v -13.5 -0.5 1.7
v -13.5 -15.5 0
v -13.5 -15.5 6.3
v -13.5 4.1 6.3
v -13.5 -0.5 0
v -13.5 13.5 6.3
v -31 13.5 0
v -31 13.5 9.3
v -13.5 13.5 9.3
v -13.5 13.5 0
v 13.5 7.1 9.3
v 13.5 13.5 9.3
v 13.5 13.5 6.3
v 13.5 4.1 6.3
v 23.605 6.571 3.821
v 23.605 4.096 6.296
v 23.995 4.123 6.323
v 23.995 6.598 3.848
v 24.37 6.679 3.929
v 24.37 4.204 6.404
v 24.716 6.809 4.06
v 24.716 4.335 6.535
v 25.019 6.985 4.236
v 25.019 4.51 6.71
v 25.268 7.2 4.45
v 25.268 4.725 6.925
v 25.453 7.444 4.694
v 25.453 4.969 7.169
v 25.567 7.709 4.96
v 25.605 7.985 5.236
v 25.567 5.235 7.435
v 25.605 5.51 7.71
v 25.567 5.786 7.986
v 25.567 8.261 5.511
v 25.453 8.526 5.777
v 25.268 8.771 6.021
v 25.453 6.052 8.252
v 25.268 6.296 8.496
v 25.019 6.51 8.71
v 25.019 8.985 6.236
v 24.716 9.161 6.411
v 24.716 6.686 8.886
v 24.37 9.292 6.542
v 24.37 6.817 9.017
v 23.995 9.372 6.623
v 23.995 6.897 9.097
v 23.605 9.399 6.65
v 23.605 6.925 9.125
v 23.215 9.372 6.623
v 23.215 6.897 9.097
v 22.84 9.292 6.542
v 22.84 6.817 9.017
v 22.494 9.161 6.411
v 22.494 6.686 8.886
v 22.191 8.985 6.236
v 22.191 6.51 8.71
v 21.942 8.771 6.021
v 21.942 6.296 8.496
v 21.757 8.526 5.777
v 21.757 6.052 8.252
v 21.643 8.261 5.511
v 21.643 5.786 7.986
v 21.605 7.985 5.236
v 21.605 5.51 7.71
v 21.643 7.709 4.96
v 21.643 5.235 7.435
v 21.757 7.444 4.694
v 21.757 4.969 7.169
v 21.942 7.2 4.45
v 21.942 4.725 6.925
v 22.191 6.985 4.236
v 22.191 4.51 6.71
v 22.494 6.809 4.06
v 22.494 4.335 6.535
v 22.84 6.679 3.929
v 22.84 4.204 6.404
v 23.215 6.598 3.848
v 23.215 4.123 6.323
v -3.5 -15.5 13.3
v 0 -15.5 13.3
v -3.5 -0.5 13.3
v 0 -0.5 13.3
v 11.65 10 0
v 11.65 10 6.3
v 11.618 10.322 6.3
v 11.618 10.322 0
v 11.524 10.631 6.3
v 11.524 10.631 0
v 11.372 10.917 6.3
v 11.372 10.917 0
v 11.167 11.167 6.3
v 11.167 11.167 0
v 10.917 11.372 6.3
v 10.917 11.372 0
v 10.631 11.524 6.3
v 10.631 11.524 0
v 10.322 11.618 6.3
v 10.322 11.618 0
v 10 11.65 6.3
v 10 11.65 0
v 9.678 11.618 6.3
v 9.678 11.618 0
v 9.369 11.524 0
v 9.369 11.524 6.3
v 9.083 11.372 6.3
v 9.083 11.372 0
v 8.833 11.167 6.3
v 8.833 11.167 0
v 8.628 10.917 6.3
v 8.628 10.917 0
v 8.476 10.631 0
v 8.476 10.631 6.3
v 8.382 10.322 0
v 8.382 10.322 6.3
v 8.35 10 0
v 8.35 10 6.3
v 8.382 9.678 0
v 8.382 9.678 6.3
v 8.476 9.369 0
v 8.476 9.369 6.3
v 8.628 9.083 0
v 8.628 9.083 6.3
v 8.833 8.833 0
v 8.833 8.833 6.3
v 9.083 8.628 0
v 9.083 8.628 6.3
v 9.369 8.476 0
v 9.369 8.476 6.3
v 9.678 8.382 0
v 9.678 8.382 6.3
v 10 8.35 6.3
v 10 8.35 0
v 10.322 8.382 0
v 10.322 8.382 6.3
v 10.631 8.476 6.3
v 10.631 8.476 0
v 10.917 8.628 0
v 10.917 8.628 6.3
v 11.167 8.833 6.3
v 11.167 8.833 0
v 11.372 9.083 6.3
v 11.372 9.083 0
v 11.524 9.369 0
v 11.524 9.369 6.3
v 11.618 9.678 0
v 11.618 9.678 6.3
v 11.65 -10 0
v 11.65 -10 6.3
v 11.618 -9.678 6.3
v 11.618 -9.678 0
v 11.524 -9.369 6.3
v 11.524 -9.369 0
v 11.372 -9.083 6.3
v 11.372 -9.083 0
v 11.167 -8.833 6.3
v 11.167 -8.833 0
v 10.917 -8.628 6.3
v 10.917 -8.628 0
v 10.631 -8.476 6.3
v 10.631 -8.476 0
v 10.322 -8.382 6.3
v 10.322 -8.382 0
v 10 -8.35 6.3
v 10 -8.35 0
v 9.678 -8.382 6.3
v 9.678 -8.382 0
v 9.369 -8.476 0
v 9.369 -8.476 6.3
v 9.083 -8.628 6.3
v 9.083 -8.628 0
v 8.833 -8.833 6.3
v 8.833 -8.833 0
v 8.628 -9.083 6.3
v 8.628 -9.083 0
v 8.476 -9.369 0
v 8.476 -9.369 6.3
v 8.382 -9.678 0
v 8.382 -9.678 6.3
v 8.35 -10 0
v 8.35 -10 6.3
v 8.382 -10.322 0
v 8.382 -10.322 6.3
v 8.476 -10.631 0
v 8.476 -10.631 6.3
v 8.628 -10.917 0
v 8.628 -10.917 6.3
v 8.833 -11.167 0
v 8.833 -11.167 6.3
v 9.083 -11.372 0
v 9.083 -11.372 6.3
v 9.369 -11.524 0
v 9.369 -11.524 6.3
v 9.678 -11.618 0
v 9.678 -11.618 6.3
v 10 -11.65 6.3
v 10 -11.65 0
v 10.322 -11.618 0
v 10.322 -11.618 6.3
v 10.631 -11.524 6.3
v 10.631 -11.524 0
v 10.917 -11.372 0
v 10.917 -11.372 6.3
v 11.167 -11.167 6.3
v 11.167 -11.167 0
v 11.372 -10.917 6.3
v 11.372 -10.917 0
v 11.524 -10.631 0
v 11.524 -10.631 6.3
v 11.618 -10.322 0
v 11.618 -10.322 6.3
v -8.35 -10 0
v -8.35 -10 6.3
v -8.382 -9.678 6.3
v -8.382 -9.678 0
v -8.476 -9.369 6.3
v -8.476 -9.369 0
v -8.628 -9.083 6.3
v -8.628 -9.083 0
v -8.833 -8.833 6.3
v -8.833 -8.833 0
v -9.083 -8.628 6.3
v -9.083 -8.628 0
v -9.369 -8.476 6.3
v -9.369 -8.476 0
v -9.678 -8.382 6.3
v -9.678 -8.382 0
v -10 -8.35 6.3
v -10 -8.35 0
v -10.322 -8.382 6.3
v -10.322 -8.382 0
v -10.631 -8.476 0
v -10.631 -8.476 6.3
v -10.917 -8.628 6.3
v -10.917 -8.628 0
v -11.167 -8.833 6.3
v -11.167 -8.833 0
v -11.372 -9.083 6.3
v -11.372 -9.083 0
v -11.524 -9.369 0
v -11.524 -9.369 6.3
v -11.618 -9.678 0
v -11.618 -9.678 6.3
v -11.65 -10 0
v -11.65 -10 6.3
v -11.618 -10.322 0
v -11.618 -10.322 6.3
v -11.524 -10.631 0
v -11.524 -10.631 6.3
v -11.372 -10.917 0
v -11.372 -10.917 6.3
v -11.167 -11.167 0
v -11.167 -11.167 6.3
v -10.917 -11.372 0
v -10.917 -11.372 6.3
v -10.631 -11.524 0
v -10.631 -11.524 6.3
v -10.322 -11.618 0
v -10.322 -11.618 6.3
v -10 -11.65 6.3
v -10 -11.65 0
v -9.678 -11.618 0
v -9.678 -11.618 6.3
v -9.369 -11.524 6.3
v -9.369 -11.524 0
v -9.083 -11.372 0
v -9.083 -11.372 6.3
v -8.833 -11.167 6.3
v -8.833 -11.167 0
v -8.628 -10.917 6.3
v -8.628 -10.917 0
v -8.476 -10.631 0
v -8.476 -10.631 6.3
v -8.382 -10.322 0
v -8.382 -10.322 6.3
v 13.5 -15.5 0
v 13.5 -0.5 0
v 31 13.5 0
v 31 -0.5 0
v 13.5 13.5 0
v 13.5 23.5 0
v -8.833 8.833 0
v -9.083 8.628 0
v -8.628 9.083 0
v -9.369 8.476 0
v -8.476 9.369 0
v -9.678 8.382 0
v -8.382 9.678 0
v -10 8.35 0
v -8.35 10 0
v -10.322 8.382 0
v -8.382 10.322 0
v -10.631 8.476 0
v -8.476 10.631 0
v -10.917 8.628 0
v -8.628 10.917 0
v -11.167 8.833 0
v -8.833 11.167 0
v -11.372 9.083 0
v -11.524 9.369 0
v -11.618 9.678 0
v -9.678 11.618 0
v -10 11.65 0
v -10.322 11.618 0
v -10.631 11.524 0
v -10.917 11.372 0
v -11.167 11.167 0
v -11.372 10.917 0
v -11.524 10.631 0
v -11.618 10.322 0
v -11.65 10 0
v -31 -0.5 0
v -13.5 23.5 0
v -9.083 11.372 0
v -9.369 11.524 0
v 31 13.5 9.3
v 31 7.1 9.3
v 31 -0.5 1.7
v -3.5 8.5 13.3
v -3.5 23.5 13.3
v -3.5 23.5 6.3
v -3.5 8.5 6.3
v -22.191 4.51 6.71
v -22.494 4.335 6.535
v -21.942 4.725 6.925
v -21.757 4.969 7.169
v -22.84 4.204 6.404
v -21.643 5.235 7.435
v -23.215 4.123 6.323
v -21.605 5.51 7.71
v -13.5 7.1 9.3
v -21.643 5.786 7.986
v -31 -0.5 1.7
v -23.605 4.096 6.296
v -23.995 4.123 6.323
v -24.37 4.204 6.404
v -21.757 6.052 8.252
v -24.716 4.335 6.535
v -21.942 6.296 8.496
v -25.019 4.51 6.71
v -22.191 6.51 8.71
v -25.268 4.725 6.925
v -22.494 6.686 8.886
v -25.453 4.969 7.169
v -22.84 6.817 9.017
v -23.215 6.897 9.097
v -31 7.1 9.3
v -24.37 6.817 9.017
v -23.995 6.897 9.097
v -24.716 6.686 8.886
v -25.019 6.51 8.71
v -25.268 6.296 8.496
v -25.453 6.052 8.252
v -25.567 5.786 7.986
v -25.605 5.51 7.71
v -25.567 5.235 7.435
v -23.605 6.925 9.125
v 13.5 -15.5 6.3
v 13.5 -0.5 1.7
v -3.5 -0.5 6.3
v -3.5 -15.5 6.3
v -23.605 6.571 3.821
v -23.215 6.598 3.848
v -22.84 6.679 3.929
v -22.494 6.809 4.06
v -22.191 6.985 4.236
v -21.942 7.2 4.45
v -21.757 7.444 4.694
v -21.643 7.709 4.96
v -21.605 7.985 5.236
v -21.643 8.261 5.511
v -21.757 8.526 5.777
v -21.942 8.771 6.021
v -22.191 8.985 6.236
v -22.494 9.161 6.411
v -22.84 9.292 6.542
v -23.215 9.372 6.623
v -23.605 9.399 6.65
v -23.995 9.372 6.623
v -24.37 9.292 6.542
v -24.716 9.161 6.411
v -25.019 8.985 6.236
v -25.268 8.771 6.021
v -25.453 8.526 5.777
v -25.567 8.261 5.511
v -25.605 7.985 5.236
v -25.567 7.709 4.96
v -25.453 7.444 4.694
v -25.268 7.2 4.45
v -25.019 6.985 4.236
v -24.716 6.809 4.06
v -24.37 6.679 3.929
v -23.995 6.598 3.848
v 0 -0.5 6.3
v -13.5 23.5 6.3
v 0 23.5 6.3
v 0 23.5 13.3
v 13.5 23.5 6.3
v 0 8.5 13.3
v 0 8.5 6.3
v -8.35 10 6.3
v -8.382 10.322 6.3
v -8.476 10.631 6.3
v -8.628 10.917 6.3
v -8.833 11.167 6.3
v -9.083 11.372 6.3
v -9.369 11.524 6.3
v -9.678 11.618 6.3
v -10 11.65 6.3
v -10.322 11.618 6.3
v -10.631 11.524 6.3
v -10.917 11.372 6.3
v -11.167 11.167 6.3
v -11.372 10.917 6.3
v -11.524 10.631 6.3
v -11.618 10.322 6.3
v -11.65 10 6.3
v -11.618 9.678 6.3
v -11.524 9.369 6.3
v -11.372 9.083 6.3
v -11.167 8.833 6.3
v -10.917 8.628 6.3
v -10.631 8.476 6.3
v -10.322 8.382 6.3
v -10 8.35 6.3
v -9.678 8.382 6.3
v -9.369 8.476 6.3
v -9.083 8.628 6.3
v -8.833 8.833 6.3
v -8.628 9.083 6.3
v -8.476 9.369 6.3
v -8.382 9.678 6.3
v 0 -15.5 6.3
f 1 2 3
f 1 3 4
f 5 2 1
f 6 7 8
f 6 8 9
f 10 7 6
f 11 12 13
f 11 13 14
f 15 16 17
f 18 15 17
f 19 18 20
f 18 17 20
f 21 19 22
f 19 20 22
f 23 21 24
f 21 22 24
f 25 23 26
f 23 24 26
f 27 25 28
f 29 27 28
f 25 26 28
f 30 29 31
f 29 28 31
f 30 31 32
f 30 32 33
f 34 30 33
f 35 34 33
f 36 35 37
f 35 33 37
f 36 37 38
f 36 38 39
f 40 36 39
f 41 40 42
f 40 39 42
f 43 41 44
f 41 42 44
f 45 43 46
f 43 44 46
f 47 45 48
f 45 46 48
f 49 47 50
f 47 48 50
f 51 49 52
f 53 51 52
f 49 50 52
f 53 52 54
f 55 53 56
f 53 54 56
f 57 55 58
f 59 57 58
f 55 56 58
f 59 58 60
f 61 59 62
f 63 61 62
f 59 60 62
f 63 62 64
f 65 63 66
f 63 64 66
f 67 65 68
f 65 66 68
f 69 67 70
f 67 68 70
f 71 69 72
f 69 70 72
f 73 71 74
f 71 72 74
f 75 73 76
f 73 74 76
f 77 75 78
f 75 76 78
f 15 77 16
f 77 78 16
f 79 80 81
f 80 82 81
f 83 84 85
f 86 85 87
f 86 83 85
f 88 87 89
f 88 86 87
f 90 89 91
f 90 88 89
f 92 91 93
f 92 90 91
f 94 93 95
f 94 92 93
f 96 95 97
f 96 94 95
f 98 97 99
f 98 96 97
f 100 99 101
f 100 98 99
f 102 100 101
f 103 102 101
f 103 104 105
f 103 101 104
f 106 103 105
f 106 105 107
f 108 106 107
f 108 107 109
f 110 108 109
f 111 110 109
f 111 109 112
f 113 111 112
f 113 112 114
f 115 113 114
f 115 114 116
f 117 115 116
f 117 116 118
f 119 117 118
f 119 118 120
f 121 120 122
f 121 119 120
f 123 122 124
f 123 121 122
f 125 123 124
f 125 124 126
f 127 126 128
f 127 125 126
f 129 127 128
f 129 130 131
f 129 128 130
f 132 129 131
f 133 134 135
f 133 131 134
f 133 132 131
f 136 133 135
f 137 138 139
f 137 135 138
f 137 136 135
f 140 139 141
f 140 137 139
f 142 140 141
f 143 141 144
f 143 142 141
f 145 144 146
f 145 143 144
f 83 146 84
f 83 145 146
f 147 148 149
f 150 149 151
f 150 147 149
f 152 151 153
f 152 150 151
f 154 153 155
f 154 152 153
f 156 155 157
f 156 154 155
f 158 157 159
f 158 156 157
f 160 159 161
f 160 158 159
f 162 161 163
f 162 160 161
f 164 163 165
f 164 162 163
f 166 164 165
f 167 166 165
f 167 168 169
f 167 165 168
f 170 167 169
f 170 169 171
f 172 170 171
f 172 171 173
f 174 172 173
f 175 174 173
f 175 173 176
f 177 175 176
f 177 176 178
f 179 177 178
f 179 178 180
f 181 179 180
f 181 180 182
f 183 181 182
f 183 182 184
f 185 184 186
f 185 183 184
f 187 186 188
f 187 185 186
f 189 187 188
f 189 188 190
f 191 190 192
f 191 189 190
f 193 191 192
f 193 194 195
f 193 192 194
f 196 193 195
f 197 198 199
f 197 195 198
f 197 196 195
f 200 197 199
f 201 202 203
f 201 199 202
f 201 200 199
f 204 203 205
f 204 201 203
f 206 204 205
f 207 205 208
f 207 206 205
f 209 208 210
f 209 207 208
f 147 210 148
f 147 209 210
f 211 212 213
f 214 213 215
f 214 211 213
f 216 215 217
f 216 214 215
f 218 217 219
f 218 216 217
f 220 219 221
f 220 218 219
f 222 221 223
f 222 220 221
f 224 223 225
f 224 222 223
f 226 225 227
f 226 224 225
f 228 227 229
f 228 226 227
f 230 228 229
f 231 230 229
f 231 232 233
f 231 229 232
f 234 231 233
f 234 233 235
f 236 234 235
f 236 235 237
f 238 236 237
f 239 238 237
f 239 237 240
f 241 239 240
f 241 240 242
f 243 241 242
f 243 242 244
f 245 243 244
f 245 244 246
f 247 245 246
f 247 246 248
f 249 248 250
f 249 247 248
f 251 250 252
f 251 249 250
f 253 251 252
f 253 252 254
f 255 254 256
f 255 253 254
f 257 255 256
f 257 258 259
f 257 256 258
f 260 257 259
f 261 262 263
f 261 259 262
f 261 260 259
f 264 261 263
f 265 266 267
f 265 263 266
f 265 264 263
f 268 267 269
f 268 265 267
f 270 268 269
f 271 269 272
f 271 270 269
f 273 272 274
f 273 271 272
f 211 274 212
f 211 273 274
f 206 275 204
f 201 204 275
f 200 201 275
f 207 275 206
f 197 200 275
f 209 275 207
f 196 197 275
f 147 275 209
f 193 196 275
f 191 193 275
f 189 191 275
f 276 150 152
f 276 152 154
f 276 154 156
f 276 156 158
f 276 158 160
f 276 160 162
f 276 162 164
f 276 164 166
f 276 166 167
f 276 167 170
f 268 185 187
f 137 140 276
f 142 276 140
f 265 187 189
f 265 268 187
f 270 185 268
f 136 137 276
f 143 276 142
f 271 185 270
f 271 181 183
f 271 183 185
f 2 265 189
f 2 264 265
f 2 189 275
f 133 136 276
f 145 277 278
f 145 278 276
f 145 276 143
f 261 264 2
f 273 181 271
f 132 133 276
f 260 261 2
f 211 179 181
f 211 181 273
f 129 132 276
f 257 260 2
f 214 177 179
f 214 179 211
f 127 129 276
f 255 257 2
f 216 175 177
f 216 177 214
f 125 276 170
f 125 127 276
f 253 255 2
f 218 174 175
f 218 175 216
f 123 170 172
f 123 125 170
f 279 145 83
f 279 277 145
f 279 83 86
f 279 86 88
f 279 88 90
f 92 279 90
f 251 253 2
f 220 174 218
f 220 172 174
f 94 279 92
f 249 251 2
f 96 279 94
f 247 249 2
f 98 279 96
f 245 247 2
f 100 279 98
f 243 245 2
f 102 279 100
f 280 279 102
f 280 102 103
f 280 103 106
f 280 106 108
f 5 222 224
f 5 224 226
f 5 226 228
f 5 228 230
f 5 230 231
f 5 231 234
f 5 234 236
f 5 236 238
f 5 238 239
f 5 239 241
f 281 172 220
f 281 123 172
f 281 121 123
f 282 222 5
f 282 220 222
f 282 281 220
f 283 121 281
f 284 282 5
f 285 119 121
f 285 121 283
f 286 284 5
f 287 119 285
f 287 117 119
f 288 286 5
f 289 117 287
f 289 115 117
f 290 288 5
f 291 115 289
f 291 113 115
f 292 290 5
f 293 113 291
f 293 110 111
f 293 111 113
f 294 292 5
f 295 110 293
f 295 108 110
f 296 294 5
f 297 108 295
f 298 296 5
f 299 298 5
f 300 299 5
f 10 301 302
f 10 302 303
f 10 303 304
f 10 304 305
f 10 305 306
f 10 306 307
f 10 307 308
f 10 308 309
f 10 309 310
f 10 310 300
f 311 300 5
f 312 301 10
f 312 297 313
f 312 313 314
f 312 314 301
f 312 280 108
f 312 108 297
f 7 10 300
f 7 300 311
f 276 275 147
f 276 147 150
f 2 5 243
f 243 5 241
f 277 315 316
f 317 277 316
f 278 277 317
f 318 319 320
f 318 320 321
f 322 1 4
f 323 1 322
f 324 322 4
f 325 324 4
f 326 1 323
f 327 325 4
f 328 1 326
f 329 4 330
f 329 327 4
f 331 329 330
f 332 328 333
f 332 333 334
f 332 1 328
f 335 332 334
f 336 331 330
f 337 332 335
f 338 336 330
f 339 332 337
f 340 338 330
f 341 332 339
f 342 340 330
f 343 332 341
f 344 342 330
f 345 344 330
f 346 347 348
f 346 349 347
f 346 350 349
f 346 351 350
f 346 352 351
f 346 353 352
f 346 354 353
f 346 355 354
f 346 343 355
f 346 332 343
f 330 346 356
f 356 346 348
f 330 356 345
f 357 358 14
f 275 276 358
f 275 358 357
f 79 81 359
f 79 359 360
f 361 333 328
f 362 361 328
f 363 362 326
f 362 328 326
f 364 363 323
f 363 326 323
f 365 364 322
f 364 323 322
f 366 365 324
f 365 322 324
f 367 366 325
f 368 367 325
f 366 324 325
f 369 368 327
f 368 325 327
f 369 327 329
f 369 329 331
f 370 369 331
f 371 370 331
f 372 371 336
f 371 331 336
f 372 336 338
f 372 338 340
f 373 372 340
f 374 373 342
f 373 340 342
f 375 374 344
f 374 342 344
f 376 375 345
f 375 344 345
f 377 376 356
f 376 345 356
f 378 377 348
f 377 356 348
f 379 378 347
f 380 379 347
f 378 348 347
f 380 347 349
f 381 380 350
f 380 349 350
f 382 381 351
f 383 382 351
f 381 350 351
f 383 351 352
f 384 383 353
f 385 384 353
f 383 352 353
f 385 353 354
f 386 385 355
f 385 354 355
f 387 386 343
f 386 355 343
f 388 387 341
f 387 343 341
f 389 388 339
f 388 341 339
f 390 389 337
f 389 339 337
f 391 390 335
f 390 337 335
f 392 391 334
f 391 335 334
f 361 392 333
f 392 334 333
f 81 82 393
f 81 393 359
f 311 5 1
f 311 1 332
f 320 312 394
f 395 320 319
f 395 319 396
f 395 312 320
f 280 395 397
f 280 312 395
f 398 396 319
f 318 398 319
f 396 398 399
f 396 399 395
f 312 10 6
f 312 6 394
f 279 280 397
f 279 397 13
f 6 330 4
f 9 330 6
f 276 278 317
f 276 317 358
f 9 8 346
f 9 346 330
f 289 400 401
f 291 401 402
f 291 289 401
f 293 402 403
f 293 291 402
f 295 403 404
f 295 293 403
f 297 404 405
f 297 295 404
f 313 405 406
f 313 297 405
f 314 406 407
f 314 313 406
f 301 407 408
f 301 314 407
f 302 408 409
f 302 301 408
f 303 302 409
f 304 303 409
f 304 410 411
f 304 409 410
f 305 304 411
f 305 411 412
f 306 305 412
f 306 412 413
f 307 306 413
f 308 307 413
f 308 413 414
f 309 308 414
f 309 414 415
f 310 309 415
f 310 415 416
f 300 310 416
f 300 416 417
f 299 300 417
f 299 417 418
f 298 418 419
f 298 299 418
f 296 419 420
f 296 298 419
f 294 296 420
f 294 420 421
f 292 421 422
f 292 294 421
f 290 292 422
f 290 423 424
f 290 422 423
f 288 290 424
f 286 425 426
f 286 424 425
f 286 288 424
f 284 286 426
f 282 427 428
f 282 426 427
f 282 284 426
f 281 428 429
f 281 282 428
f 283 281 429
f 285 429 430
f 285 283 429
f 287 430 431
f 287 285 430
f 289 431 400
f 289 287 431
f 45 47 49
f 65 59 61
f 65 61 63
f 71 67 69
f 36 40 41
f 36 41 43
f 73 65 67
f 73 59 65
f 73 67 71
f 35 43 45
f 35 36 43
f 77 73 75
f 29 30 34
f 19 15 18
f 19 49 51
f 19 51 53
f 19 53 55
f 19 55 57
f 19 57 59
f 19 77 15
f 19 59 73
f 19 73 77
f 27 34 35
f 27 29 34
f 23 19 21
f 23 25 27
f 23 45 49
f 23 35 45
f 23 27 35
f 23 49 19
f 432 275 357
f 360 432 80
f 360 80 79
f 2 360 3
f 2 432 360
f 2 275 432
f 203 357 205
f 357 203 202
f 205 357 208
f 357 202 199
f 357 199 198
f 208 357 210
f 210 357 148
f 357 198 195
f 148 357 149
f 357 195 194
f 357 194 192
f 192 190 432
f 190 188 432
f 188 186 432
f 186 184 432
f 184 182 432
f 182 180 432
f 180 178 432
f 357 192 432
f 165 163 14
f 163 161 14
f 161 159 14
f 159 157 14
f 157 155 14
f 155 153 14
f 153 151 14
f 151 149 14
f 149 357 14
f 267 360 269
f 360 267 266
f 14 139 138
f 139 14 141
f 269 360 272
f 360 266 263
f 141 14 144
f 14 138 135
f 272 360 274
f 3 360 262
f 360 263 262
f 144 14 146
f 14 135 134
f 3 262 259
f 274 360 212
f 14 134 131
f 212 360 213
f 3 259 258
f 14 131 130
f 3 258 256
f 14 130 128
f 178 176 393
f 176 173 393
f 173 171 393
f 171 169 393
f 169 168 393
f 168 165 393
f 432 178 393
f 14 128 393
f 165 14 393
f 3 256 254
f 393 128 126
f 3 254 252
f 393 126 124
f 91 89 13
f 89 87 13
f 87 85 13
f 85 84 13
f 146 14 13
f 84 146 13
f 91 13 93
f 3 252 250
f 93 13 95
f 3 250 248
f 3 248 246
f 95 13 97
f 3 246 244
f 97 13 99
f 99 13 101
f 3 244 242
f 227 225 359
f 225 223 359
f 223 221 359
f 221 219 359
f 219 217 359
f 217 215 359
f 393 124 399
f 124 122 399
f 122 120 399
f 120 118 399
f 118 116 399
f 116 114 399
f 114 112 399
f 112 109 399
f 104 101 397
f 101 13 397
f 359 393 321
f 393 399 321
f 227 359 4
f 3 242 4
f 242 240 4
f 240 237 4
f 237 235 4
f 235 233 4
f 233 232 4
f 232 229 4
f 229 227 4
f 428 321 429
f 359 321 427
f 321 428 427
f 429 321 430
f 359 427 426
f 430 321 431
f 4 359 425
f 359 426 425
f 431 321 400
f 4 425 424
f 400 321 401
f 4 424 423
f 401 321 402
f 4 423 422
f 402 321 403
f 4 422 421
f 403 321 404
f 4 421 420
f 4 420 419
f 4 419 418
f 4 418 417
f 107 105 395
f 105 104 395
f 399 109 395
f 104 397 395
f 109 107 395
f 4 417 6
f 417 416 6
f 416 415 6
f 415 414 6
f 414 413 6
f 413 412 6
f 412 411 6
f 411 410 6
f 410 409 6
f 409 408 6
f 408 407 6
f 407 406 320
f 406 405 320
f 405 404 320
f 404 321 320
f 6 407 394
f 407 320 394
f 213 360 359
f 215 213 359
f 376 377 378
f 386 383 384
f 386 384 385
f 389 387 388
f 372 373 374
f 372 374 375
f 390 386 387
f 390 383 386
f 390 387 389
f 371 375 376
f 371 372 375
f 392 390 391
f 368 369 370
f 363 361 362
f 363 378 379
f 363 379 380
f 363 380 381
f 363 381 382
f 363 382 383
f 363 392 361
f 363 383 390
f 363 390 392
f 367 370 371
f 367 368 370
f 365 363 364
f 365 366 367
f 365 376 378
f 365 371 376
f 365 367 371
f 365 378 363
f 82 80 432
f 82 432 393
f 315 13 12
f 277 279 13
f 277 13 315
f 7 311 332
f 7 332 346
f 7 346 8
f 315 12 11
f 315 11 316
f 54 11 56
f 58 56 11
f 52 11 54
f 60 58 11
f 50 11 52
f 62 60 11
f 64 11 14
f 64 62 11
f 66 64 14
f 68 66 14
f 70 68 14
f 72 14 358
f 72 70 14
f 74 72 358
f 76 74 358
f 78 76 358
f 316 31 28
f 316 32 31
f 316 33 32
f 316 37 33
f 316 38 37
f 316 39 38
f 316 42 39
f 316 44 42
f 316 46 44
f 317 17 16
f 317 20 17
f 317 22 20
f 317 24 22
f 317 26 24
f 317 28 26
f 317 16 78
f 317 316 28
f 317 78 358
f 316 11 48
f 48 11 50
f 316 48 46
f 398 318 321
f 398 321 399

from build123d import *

# Parameters (mm, degrees)
SKETCH_1_R             = 1.65
EXTRUDE_512_DEPTH      = 13.3
CUT_EXTRUDE_925_DEPTH  = 7
SKETCH_3_W             = 17.5
SKETCH_3_H             = 14
CUT_EXTRUDE_1164_DEPTH = 4
CUT_EXTRUDE_R_DEPTH    = 17.5
CUT_EXTRUDE_L_DEPTH    = 17.5
SKETCH_6_R             = 2
CUT_EXTRUDE_5_DEPTH    = 3.5


with BuildPart() as part:
    # Эскиз1 → Extrude 512 (new body)
    with BuildSketch(Plane.XY):
        Polygon((-13.5, 23.5), (13.5, 23.5), (13.5, 13.5), (31, 13.5), (31, -0.5), (13.5, -0.5), (13.5, -15.5), (-13.5, -15.5), (-13.5, -0.5), (-31, -0.5), (-31, 13.5), (-13.5, 13.5), align=None)
        with Locations((-10, 10)):
            Circle(SKETCH_1_R, mode=Mode.SUBTRACT)
        with Locations((10, 10)):
            Circle(SKETCH_1_R, mode=Mode.SUBTRACT)
        with Locations((10, -10)):
            Circle(SKETCH_1_R, mode=Mode.SUBTRACT)
        with Locations((-10, -10)):
            Circle(SKETCH_1_R, mode=Mode.SUBTRACT)
    extrude(amount=EXTRUDE_512_DEPTH)

    # Эскиз2 → Cut-Extrude 925 (cut)
    with BuildSketch(Plane.XY.offset(13.3)):
        Polygon((0, 23.5), (13.5, 23.5), (13.5, -15.5), (0, -15.5), (0, -0.5), (-3.5, -0.5), (-3.5, -15.5), (-13.5, -15.5), (-13.5, 23.5), (-3.5, 23.5), (-3.5, 8.5), (0, 8.5), align=None)
    extrude(amount=-CUT_EXTRUDE_925_DEPTH, mode=Mode.SUBTRACT)

    # Эскиз3 → Cut-Extrude 1164 (cut)
    with BuildSketch(Plane.XY.offset(13.3)):
        with Locations((-22.25, 6.5)):
            Rectangle(SKETCH_3_W, SKETCH_3_H)
        with Locations((22.25, 6.5)):
            Rectangle(SKETCH_3_W, SKETCH_3_H)
    extrude(amount=-CUT_EXTRUDE_1164_DEPTH, mode=Mode.SUBTRACT)

    # Эскиз4 → СрезТягиR (cut)
    with BuildSketch(Plane(origin=(31, 0, 0), x_dir=(0, 0, -1), z_dir=(1, 0, 0))):
        Polygon((-9.3, 7.1), (-1.7, -0.5), (-9.3, -0.5), align=None)
    extrude(amount=-CUT_EXTRUDE_R_DEPTH, mode=Mode.SUBTRACT)

    # Эскиз5 → СрезТягиL (cut)
    with BuildSketch(Plane.ZY.offset(31)):
        Polygon((9.3, 7.1), (9.3, -0.5), (1.7, -0.5), align=None)
    extrude(amount=-CUT_EXTRUDE_L_DEPTH, mode=Mode.SUBTRACT)

    # Эскиз6 → Вырез-Вытянуть5 (cut)
    with BuildSketch(Plane(origin=(0, -1.1, 1.1), x_dir=(1, 0, 0), z_dir=(0, -0.7071067811865472, 0.7071067811865478))):
        with Locations(Location((-23.605, 9.348528137, 0), (0, 0, 270))):
            Circle(SKETCH_6_R)
        with Locations(Location((23.605, 9.348528137, 0), (0, 0, 270))):
            Circle(SKETCH_6_R)
    extrude(amount=-CUT_EXTRUDE_5_DEPTH, mode=Mode.SUBTRACT)


solid = part.part
